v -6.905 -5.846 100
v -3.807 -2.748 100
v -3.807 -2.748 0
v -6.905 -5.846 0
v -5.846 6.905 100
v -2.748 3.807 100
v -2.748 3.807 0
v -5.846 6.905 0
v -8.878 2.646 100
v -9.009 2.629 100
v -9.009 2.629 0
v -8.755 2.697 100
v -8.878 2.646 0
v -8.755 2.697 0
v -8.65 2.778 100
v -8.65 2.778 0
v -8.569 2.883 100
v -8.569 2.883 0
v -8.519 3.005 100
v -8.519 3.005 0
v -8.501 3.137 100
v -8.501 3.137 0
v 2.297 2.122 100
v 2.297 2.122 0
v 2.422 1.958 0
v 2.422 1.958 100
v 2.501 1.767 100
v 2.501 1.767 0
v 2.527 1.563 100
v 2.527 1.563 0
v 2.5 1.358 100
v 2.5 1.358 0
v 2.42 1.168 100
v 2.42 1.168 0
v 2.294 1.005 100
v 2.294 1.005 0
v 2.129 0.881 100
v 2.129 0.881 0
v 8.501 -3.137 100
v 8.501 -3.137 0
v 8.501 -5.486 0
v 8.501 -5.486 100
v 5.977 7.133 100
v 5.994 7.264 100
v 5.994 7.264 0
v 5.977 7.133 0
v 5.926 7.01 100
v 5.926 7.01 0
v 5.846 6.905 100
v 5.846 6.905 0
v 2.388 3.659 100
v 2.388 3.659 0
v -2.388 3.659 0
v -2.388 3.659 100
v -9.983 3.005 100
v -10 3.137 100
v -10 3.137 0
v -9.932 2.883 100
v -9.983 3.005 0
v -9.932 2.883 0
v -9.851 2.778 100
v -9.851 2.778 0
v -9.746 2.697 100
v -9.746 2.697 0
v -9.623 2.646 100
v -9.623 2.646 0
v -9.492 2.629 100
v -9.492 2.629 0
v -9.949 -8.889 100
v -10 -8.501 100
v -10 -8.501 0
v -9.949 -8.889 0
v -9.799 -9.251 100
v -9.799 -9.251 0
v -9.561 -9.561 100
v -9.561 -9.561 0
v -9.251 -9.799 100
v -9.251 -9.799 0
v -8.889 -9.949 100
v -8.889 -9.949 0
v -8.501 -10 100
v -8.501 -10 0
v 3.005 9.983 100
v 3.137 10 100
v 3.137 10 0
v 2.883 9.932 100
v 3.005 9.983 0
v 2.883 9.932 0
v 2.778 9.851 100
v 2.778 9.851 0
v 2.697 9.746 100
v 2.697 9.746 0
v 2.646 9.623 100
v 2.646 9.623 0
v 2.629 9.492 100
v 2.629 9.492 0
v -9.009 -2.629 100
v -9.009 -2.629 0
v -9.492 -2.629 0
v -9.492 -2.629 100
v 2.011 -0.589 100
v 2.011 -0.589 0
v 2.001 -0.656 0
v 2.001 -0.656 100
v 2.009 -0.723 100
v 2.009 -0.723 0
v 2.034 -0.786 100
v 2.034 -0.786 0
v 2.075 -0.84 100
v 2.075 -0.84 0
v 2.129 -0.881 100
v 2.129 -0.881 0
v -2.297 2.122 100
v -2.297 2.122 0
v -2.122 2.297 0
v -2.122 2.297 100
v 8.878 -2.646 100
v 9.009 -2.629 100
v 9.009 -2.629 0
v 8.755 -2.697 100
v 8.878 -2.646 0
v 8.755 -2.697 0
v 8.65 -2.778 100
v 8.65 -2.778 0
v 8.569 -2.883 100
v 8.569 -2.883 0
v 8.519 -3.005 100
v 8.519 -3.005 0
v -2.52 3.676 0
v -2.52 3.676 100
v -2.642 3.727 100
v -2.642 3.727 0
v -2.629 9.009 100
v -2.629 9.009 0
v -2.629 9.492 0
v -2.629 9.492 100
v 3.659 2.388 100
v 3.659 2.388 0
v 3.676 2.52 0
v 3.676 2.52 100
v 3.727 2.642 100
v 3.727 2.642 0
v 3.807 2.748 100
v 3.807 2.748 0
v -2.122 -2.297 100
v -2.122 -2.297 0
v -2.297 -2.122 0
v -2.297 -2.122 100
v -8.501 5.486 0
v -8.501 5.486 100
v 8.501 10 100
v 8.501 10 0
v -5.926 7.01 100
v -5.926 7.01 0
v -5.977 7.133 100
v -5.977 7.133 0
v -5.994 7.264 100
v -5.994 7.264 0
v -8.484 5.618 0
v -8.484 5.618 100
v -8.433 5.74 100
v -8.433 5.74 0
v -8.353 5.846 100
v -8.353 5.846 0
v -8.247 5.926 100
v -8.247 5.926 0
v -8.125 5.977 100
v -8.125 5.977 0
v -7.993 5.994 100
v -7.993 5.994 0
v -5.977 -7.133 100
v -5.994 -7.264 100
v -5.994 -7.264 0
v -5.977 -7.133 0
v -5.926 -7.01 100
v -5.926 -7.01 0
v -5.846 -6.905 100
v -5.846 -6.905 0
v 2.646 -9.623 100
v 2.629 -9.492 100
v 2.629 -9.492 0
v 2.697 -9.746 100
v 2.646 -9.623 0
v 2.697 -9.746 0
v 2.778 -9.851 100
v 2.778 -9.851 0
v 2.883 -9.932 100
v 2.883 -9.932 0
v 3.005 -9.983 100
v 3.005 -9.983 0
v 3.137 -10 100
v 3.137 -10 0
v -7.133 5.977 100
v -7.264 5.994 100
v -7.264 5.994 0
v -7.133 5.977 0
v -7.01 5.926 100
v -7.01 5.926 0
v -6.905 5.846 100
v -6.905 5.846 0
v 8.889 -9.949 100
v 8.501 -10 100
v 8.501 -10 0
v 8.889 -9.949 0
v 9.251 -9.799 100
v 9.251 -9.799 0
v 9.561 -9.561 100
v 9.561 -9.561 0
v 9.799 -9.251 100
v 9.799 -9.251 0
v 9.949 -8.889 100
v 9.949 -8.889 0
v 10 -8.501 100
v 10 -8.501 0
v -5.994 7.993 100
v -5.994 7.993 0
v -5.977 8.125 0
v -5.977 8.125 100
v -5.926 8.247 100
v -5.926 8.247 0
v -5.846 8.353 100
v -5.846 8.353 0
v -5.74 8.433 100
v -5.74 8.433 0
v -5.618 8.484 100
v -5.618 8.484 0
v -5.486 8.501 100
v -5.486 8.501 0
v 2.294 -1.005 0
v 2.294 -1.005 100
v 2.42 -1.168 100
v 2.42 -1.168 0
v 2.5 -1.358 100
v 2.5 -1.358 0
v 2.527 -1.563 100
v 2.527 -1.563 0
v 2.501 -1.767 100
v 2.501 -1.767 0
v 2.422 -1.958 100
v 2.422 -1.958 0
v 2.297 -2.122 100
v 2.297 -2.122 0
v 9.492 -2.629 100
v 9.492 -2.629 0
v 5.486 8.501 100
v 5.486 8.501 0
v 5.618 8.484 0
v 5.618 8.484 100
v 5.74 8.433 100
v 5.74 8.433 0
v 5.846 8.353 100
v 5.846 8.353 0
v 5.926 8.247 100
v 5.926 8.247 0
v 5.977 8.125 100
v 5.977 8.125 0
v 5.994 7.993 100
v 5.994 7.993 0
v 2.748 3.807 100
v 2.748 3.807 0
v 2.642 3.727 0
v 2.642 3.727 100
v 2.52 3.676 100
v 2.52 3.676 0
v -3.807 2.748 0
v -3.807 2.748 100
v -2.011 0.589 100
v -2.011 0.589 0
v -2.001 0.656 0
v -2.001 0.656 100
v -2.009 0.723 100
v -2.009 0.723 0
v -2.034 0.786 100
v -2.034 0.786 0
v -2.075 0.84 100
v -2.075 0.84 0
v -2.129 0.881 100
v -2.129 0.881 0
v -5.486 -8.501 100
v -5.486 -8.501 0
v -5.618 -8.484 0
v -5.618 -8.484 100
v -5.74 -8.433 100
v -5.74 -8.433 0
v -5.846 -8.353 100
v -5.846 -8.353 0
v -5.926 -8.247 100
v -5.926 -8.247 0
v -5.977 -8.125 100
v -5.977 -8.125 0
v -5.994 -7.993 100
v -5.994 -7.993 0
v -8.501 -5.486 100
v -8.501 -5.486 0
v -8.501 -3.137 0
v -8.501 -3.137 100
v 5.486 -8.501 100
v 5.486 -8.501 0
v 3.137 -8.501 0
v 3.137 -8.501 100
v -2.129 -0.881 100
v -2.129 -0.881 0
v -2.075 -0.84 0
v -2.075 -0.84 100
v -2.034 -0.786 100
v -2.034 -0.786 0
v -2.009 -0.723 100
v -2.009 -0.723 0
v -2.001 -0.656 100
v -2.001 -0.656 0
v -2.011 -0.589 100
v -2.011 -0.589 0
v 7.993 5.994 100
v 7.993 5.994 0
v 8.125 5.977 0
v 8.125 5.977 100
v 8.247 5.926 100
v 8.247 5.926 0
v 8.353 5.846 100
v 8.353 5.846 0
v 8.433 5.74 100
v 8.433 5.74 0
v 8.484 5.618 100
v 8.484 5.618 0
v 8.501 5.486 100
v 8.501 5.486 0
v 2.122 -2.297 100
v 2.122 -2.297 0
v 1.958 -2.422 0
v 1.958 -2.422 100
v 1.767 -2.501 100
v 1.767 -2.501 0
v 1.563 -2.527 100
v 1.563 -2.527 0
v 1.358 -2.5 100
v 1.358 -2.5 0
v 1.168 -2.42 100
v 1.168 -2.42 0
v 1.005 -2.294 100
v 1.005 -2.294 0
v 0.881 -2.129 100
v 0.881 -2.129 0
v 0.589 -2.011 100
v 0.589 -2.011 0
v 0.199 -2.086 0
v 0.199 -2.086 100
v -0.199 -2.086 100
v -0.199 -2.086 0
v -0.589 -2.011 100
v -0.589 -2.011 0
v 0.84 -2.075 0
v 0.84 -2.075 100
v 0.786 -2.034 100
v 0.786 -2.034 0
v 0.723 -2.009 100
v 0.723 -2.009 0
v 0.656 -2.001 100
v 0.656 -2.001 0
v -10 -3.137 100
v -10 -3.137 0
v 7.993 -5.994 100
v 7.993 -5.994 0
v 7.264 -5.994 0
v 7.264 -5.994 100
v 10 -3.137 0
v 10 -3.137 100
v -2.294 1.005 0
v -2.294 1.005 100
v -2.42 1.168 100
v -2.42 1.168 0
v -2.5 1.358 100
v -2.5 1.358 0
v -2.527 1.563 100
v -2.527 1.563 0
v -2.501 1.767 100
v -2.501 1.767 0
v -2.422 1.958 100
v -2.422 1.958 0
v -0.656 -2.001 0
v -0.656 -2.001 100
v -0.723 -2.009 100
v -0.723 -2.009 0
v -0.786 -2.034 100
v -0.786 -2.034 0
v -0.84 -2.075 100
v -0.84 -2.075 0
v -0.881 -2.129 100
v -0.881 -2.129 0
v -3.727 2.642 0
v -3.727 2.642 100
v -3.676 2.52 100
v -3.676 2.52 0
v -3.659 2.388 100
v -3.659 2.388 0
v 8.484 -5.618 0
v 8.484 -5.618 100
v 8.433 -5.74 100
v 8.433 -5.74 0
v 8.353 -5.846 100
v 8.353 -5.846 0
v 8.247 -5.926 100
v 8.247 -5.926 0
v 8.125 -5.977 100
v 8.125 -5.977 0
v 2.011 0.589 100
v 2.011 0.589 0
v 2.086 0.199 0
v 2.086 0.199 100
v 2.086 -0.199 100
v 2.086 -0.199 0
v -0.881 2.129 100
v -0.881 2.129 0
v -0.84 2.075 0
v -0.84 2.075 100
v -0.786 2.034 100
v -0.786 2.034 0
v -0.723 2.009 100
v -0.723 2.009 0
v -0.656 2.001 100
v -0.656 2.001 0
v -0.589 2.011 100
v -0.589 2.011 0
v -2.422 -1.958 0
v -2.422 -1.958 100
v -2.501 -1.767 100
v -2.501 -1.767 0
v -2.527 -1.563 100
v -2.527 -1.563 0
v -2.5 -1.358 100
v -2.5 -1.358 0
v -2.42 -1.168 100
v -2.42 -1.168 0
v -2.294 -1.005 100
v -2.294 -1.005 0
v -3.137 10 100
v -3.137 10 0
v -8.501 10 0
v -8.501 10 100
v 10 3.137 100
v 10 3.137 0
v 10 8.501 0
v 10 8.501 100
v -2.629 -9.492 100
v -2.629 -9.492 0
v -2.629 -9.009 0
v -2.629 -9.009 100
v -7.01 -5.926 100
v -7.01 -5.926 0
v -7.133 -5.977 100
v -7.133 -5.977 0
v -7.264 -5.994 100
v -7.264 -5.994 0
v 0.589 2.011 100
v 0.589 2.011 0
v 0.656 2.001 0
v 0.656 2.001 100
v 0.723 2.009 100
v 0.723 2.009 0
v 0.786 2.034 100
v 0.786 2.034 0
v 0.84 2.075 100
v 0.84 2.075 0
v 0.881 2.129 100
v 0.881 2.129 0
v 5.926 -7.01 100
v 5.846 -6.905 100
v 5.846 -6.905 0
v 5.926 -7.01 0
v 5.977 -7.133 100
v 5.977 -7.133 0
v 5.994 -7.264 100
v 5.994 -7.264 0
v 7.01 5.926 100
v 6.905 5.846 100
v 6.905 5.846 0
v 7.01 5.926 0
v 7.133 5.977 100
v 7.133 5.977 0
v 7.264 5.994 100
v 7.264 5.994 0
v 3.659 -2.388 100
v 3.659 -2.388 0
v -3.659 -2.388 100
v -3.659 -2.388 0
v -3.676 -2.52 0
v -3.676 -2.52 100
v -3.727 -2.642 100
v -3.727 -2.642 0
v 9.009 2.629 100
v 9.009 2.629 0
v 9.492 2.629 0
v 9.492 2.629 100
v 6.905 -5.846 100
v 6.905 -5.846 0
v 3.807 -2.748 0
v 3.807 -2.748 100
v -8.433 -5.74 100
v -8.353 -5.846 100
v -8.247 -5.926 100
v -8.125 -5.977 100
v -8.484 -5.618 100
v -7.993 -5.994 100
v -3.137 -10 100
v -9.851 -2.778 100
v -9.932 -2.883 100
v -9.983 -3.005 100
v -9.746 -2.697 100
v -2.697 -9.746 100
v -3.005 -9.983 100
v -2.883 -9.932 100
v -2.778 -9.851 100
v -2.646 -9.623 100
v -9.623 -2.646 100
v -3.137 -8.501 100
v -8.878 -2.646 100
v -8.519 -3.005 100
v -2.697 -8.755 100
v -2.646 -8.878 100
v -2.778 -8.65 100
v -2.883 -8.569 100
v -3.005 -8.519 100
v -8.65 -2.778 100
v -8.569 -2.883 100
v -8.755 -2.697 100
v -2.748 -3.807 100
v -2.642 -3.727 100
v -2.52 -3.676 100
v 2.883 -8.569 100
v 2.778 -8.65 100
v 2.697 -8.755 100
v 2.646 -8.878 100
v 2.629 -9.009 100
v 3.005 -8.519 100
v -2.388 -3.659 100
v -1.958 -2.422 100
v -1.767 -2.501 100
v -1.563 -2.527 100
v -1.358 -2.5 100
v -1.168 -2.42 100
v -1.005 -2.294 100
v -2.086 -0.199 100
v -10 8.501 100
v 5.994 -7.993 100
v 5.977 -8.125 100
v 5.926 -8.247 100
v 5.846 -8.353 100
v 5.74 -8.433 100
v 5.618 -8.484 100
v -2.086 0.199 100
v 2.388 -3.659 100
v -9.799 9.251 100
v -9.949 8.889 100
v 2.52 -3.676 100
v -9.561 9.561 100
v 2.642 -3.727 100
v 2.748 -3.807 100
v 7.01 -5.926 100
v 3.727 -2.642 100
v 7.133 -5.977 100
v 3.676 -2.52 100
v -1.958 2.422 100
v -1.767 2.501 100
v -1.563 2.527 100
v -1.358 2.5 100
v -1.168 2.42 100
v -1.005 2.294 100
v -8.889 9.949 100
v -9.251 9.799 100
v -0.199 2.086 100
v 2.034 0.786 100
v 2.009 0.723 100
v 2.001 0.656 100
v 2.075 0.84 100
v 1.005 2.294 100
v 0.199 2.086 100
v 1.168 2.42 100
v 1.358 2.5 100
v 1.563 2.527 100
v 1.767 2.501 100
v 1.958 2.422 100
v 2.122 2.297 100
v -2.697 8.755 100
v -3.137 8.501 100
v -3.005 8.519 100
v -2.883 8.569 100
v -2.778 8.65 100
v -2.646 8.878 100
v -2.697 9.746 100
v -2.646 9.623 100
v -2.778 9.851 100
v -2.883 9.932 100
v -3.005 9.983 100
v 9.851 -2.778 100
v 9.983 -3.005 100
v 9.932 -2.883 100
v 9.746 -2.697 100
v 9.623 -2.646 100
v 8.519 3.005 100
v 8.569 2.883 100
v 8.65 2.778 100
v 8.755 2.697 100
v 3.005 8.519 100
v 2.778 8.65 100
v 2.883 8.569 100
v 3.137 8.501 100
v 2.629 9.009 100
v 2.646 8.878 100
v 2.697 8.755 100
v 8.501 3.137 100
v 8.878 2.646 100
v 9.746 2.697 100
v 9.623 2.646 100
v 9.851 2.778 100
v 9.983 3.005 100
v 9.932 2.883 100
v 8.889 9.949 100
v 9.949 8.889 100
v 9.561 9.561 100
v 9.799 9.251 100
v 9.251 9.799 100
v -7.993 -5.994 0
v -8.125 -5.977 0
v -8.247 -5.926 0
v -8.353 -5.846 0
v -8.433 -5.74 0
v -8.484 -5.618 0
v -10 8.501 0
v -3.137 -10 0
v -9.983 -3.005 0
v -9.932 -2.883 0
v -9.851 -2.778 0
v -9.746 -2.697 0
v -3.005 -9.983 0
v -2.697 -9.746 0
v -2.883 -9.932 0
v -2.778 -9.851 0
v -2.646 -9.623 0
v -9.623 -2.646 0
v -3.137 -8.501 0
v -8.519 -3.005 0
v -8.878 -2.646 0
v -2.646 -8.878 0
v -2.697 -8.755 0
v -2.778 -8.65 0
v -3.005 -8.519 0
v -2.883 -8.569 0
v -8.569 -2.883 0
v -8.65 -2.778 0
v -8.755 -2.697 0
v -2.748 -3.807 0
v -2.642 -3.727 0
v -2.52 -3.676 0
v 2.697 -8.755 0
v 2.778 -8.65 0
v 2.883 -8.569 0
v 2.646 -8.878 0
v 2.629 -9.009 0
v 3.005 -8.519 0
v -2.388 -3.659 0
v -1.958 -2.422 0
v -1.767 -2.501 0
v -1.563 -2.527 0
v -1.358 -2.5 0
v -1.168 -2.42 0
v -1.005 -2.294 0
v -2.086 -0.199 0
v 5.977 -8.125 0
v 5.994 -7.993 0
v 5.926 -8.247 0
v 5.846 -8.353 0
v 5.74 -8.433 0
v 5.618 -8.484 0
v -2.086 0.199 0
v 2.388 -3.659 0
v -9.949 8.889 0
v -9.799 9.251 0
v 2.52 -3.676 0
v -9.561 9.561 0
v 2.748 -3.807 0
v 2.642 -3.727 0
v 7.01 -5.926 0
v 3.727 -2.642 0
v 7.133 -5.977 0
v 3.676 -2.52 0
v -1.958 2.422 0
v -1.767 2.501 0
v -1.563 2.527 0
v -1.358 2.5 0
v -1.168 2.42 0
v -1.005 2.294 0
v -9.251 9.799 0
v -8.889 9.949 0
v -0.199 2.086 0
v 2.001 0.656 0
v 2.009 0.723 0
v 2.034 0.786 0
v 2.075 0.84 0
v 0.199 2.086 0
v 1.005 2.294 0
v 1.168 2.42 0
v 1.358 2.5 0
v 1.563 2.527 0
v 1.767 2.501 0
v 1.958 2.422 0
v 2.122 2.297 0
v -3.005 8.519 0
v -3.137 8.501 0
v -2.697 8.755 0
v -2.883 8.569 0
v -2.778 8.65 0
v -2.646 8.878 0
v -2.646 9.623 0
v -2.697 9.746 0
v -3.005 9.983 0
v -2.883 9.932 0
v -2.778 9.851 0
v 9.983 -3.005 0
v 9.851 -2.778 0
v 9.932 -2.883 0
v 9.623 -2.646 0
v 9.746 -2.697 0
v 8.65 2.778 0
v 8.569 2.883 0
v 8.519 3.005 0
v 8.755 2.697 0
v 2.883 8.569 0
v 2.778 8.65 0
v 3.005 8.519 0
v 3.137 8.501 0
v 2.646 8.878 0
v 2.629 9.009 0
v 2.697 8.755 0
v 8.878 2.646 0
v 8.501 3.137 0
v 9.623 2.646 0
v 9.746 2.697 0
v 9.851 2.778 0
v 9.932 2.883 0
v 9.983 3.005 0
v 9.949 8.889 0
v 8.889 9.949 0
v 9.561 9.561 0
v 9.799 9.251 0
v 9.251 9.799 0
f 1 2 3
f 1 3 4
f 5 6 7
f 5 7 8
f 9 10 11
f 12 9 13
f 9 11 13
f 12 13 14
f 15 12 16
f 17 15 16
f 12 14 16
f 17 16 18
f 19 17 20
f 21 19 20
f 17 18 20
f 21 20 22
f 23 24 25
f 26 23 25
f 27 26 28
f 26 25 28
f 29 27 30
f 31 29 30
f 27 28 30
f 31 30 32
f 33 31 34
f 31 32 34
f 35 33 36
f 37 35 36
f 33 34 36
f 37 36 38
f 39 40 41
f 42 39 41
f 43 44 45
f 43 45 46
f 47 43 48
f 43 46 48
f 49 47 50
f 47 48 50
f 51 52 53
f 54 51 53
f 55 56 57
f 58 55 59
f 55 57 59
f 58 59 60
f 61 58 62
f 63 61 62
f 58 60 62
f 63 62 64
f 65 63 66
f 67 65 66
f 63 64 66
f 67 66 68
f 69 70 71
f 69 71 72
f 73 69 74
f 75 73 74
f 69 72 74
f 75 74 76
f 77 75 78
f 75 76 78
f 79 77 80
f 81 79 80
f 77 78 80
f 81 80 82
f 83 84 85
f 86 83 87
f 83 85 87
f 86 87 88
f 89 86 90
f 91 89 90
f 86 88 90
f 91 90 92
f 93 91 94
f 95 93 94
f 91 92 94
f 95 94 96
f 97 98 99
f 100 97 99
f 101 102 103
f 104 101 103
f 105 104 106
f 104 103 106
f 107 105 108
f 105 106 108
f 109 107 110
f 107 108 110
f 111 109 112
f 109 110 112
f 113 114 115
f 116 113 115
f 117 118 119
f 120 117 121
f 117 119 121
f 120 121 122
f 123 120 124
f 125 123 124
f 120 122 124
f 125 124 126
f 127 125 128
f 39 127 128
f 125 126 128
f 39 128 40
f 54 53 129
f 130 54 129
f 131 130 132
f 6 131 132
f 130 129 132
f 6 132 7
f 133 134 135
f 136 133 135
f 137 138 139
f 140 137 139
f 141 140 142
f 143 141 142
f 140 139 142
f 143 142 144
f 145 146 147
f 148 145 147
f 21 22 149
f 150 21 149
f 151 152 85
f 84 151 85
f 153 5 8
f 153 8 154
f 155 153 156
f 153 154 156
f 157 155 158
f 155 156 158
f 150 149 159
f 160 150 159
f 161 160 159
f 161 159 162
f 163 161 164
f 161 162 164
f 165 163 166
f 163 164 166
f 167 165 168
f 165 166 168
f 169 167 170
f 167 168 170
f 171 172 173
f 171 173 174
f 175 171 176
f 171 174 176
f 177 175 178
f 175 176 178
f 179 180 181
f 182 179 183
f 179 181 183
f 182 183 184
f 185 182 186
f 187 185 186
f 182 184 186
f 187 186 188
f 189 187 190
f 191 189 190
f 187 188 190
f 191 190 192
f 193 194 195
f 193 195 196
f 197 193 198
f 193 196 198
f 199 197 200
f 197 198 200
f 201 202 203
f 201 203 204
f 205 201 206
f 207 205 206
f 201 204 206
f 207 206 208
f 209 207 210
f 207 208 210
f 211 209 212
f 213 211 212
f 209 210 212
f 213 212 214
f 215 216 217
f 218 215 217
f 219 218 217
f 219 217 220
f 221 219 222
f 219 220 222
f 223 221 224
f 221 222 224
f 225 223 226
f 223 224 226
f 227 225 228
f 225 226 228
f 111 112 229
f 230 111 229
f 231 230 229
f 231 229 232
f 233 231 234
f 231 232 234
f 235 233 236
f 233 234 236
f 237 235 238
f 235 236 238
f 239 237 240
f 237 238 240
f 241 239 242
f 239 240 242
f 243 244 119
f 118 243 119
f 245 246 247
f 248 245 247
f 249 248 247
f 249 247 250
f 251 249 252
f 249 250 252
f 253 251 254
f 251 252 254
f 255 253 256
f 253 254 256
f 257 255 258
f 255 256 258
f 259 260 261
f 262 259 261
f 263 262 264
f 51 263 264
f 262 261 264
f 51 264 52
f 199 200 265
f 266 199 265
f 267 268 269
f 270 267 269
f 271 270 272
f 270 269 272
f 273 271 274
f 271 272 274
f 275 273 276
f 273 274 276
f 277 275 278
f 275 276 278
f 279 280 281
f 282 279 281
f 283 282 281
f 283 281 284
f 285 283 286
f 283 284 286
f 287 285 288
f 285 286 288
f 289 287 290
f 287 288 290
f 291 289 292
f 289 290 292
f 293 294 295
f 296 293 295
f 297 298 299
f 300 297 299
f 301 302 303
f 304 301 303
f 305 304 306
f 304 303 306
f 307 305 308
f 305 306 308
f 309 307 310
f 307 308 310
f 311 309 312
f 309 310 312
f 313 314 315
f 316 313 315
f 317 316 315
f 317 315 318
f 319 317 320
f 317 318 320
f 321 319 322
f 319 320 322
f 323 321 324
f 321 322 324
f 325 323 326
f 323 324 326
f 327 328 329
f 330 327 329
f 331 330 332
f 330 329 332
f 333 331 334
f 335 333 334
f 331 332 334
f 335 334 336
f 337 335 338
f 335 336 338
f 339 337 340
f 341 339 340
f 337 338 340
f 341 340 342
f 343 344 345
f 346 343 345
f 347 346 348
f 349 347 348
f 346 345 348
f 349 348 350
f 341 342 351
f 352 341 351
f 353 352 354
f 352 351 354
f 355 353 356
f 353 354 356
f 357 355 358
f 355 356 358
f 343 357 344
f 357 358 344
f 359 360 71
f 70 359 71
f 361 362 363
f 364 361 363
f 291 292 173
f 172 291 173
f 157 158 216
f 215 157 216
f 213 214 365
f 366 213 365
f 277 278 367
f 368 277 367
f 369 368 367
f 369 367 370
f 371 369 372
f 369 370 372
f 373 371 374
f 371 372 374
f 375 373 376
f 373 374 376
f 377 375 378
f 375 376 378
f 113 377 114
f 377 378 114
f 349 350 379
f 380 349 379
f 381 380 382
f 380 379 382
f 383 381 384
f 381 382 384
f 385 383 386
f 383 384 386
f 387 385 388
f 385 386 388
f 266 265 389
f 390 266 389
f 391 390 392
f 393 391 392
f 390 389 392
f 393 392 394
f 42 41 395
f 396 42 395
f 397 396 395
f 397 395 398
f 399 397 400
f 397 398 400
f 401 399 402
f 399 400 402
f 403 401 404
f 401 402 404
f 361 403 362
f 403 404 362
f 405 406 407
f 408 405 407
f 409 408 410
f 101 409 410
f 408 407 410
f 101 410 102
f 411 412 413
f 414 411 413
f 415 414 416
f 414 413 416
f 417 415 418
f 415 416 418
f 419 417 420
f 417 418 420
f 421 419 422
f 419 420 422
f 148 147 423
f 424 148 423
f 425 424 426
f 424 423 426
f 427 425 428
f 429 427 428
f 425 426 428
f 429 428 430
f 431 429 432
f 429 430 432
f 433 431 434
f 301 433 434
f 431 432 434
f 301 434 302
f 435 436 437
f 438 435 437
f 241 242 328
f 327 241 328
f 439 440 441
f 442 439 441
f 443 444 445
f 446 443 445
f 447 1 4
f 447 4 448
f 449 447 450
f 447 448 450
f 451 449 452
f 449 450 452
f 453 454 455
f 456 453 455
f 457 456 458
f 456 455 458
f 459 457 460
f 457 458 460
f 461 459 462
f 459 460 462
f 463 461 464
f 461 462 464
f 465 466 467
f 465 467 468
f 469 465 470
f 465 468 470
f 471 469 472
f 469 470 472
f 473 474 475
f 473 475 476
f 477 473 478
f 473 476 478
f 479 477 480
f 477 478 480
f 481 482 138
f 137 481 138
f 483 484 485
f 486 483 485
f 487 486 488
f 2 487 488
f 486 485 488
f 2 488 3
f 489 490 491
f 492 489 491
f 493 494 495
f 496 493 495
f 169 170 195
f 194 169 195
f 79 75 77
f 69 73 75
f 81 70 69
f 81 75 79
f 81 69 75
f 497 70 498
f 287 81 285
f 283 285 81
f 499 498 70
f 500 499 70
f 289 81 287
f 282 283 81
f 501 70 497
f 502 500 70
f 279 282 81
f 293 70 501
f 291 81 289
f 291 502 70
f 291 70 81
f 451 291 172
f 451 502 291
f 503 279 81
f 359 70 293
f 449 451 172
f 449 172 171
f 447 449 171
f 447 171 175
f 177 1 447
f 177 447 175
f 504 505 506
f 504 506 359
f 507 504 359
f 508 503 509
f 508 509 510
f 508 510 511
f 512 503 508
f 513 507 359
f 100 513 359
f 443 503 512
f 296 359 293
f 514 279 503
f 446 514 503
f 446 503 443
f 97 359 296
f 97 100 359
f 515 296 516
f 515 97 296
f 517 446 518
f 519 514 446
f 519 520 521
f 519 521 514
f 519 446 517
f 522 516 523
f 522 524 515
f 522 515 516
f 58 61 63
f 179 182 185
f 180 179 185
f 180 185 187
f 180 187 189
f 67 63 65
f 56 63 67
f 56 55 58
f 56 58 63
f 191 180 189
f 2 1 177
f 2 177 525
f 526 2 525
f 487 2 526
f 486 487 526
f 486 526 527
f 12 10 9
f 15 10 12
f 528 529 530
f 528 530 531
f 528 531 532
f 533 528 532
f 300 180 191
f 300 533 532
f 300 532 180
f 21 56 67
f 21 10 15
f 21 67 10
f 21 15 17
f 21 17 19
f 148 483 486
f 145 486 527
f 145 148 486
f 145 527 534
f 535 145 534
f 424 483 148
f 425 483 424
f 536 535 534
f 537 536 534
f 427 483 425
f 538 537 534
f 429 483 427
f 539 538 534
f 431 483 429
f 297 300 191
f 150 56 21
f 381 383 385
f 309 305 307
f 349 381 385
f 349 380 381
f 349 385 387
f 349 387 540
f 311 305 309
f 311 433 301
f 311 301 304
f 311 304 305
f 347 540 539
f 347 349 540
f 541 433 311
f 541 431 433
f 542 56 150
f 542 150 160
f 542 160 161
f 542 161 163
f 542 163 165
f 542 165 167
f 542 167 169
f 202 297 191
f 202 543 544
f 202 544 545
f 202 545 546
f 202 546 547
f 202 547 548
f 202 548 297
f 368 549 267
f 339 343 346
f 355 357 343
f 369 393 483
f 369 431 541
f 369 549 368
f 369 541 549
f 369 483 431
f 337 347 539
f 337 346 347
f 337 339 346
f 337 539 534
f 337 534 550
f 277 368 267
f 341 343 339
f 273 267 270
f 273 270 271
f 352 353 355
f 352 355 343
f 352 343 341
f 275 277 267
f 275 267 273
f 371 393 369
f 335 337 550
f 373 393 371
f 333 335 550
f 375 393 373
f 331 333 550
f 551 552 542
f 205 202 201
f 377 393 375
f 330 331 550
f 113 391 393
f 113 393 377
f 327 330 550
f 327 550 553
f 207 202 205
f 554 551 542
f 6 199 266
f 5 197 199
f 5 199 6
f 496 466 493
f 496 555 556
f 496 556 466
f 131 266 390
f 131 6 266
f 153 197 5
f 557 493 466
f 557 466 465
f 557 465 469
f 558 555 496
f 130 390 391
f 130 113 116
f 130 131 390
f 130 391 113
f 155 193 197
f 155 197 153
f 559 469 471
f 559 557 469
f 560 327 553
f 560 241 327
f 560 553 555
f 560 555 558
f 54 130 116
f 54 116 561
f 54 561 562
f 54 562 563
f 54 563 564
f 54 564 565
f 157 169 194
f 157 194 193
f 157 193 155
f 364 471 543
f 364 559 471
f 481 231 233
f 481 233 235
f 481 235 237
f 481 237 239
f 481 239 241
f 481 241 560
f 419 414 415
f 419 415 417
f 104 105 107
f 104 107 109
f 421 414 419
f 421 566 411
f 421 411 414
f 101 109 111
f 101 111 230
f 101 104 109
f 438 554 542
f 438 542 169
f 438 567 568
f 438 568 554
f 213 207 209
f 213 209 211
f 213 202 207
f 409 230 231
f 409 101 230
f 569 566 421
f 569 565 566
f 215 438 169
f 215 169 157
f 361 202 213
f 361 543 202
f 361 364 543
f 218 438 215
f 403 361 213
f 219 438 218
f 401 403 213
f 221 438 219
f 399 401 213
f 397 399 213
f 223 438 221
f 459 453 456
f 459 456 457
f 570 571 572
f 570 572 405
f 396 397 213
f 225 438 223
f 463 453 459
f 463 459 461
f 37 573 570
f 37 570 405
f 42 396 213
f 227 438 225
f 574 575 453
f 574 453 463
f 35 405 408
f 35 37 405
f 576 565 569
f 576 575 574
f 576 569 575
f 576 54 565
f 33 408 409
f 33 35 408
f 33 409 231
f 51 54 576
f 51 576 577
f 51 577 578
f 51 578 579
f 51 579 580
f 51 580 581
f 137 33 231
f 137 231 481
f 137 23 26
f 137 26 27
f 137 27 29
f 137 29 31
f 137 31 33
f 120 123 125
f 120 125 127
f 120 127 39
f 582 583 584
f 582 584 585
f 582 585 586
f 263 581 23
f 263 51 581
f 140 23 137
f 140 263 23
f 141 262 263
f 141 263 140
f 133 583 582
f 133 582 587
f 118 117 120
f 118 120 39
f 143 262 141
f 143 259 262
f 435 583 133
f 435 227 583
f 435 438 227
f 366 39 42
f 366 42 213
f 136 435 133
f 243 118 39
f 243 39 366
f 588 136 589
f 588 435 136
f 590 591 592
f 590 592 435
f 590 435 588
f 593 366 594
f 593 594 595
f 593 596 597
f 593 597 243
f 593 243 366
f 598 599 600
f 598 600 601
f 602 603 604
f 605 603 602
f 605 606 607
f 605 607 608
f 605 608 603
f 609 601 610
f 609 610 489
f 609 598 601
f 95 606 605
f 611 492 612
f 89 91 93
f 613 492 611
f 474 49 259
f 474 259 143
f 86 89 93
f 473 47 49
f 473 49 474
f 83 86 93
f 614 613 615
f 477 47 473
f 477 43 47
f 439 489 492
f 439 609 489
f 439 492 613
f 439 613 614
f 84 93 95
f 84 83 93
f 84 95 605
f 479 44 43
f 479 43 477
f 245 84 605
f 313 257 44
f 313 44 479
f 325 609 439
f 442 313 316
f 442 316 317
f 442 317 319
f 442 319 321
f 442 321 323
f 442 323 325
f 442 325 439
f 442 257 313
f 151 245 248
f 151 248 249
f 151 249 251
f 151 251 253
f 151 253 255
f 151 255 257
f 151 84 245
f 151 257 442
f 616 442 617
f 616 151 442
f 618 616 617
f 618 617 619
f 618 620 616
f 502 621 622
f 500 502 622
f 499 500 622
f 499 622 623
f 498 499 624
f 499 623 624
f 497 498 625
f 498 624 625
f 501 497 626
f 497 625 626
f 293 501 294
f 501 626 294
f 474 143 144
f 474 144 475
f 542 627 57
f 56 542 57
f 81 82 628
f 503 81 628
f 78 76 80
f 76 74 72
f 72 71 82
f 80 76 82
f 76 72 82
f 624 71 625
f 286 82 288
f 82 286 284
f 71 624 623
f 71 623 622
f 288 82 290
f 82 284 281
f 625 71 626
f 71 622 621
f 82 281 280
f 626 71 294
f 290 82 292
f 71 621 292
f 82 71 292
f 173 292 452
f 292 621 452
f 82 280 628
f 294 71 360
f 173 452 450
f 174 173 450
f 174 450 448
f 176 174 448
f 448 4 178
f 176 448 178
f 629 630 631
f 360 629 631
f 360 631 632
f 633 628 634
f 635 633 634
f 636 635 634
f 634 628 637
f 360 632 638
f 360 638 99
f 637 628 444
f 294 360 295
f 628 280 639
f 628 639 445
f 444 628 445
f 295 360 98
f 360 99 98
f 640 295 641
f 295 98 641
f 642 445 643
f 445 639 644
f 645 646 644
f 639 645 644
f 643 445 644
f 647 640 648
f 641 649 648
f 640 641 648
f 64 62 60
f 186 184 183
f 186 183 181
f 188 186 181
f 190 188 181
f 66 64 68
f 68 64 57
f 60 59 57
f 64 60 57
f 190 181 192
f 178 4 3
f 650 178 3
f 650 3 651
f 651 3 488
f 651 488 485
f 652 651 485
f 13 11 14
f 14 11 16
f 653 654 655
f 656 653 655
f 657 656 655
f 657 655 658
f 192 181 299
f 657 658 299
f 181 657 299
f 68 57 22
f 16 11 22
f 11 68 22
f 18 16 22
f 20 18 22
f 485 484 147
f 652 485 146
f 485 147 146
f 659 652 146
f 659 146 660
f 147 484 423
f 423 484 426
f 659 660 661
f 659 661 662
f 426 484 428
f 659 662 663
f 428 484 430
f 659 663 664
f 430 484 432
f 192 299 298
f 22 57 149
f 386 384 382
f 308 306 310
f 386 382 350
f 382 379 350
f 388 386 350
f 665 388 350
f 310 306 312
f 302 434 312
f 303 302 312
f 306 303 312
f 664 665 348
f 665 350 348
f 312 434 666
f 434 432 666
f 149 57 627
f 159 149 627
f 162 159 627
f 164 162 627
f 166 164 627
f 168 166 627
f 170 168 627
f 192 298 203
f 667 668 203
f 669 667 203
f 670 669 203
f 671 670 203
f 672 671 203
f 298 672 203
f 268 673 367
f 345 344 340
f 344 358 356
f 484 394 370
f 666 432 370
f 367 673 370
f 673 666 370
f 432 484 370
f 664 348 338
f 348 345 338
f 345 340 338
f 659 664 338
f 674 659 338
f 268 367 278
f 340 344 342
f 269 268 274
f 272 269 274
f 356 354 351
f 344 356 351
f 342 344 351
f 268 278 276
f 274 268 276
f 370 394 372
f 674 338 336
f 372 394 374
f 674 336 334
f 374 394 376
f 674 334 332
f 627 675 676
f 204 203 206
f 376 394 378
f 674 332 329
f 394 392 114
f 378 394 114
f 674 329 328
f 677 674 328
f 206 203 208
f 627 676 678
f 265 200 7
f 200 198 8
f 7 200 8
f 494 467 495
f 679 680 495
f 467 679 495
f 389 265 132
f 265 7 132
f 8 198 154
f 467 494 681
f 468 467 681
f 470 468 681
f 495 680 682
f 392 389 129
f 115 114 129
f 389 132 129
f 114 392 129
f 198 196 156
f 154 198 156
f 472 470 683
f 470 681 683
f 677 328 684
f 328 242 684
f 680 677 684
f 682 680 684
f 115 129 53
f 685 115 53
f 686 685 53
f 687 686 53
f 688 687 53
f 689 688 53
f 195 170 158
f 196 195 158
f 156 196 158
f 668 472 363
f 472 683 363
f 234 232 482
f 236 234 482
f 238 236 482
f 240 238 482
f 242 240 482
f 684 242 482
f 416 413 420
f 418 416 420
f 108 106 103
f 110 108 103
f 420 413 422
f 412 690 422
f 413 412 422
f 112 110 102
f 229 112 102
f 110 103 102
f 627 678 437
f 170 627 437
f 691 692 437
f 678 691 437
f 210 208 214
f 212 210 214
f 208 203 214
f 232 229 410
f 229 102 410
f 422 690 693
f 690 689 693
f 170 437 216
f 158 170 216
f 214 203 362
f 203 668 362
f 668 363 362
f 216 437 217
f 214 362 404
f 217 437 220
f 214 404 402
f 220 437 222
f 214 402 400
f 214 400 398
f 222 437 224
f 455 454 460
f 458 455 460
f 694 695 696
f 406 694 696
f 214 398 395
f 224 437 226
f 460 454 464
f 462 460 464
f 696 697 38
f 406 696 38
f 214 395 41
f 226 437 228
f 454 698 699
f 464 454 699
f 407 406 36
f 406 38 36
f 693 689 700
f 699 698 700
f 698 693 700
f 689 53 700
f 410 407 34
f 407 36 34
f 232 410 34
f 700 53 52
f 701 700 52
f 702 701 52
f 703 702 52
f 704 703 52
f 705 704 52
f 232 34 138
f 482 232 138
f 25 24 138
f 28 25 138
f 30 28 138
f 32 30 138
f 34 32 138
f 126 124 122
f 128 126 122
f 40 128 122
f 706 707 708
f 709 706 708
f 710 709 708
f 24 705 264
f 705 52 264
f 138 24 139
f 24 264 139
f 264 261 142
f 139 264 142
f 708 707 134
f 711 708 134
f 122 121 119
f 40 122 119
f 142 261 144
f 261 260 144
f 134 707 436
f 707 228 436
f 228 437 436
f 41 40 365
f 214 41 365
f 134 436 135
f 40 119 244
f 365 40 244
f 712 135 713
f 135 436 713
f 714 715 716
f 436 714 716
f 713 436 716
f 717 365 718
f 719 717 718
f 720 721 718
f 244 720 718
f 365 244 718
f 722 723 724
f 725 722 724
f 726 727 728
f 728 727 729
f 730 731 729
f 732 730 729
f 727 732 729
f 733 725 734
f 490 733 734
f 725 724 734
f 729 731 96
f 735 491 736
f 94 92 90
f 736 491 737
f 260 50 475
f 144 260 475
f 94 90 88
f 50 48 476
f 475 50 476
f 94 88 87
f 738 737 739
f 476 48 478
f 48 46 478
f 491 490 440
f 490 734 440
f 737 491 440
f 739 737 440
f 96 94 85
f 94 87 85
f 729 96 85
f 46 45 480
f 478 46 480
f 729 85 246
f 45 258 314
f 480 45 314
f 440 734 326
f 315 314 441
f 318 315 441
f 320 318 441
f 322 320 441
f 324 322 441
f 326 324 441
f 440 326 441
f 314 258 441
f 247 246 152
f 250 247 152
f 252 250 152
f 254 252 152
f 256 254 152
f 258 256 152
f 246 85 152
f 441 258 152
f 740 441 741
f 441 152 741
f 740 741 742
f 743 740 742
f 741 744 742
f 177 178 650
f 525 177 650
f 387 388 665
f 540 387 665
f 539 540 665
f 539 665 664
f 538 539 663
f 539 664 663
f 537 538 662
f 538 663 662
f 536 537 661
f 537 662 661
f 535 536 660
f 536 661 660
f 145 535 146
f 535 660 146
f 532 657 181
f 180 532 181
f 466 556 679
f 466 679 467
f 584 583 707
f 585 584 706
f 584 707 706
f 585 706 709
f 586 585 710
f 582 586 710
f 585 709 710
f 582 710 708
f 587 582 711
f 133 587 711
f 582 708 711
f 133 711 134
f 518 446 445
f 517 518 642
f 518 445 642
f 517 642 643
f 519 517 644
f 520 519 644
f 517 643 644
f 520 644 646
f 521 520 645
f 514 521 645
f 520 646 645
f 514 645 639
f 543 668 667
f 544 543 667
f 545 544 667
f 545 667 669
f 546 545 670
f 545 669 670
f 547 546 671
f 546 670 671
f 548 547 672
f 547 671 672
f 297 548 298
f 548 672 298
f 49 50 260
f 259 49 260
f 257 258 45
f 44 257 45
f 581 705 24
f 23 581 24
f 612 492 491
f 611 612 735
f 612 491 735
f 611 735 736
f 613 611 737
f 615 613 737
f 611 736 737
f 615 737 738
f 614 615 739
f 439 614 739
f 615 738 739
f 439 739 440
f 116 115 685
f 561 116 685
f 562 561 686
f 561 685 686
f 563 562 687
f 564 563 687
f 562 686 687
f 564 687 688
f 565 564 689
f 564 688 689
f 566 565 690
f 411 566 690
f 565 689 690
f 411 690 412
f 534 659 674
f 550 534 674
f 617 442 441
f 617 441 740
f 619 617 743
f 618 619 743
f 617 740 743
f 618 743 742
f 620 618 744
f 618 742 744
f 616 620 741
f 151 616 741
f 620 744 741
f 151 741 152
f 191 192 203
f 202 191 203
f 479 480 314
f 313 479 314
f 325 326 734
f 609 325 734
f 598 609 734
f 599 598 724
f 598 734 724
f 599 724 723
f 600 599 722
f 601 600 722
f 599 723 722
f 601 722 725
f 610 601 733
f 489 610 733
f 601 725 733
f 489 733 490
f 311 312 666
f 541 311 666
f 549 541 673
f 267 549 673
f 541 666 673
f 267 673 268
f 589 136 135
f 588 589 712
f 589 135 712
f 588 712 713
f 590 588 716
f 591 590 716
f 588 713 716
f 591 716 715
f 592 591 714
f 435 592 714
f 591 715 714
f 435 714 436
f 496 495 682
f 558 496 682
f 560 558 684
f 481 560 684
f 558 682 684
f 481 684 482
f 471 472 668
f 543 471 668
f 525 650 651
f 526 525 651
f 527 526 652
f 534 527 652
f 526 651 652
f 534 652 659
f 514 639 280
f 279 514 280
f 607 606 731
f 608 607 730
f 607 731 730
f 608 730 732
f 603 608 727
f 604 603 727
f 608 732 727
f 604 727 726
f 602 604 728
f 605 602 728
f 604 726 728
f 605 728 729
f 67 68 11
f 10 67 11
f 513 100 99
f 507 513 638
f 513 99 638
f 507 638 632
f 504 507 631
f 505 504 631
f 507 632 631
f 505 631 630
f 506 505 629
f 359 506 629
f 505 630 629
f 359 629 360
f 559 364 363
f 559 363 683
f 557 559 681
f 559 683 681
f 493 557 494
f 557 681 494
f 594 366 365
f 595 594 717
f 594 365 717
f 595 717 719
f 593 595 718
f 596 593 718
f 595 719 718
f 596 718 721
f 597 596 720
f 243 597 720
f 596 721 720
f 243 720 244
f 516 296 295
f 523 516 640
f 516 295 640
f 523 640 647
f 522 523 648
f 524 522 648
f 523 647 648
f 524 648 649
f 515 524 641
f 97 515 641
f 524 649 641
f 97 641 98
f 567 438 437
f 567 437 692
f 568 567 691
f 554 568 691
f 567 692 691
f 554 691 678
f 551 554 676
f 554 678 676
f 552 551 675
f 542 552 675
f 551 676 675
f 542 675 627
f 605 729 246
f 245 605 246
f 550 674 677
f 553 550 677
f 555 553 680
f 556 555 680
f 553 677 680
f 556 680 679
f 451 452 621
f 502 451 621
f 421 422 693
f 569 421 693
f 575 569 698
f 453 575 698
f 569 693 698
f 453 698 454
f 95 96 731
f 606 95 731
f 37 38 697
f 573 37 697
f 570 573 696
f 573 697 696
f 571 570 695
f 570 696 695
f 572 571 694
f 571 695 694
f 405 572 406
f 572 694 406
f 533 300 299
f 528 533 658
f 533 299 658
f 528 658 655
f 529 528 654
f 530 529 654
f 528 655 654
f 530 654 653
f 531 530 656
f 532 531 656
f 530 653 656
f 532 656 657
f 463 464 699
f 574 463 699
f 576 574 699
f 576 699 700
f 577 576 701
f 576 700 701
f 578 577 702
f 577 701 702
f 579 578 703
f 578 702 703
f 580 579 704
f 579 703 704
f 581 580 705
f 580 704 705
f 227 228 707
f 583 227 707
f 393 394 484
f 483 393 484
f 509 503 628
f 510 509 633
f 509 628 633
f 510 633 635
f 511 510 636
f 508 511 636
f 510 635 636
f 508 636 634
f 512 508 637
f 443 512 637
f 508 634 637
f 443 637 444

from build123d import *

# Parameters (mm, degrees)
BOSS_EXTRUDE1_DEPTH = 100


with BuildPart() as part:
    # Sketch1 → Boss-Extrude1 (new body)
    with BuildSketch(Plane.XY):
        with BuildLine():
            Line((9.0094, 2.6289), (9.492, 2.6289))
            ThreePointArc((9.492, 2.6289), (9.851210245, 2.777689755), (10, 3.1369))
            Line((10, 3.1369), (10, 8.5014))
            ThreePointArc((10, 8.5014), (9.561070222, 9.561070222), (8.5014, 10))
            Line((8.5014, 10), (3.1369, 10))
            ThreePointArc((3.1369, 10), (2.777689755, 9.851210245), (2.6289, 9.492))
            Line((2.6289, 9.492), (2.6289, 9.0094))
            ThreePointArc((2.6289, 9.0094), (2.777689755, 8.650189755), (3.1369, 8.5014))
            Line((3.1369, 8.5014), (5.4864, 8.5014))
            ThreePointArc((5.4864, 8.5014), (5.845610245, 8.352610245), (5.9944, 7.9934))
            Line((5.9944, 7.9934), (5.9944, 7.264490712))
            ThreePointArc((5.9944, 7.264490712), (5.955730803, 7.070087528), (5.845610245, 6.905280467))
            Line((5.845610245, 6.905280467), (2.747686782, 3.807357004))
            ThreePointArc((2.747686782, 3.807357004), (2.582879721, 3.697236446), (2.388476537, 3.658567249))
            Line((2.388476537, 3.658567249), (-2.388476537, 3.658567249))
            ThreePointArc((-2.388476537, 3.658567249), (-2.582879721, 3.697236446), (-2.747686782, 3.807357004))
            Line((-2.747686782, 3.807357004), (-5.845610245, 6.905280467))
            ThreePointArc((-5.845610245, 6.905280467), (-5.955730803, 7.070087528), (-5.9944, 7.264490712))
            Line((-5.9944, 7.264490712), (-5.9944, 7.9934))
            ThreePointArc((-5.9944, 7.9934), (-5.845610245, 8.352610245), (-5.4864, 8.5014))
            Line((-5.4864, 8.5014), (-3.1369, 8.5014))
            ThreePointArc((-3.1369, 8.5014), (-2.777689755, 8.650189755), (-2.6289, 9.0094))
            Line((-2.6289, 9.0094), (-2.6289, 9.492))
            ThreePointArc((-2.6289, 9.492), (-2.777689755, 9.851210245), (-3.1369, 10))
            Line((-3.1369, 10), (-8.5014, 10))
            ThreePointArc((-8.5014, 10), (-9.561070222, 9.561070222), (-10, 8.5014))
            Line((-10, 8.5014), (-10, 3.1369))
            ThreePointArc((-10, 3.1369), (-9.851210245, 2.777689755), (-9.492, 2.6289))
            Line((-9.492, 2.6289), (-9.0094, 2.6289))
            ThreePointArc((-9.0094, 2.6289), (-8.650189755, 2.777689755), (-8.5014, 3.1369))
            Line((-8.5014, 3.1369), (-8.5014, 5.4864))
            ThreePointArc((-8.5014, 5.4864), (-8.352610245, 5.845610245), (-7.9934, 5.9944))
            Line((-7.9934, 5.9944), (-7.264490712, 5.9944))
            ThreePointArc((-7.264490712, 5.9944), (-7.070087528, 5.955730803), (-6.905280467, 5.845610245))
            Line((-6.905280467, 5.845610245), (-3.807357004, 2.747686782))
            ThreePointArc((-3.807357004, 2.747686782), (-3.697236446, 2.582879721), (-3.658567249, 2.388476537))
            Line((-3.658567249, 2.388476537), (-3.658567249, -2.388476537))
            ThreePointArc((-3.658567249, -2.388476537), (-3.697236446, -2.582879721), (-3.807357004, -2.747686782))
            Line((-3.807357004, -2.747686782), (-6.905280467, -5.845610245))
            ThreePointArc((-6.905280467, -5.845610245), (-7.070087528, -5.955730803), (-7.264490712, -5.9944))
            Line((-7.264490712, -5.9944), (-7.9934, -5.9944))
            ThreePointArc((-7.9934, -5.9944), (-8.352610245, -5.845610245), (-8.5014, -5.4864))
            Line((-8.5014, -5.4864), (-8.5014, -3.1369))
            ThreePointArc((-8.5014, -3.1369), (-8.650189755, -2.777689755), (-9.0094, -2.6289))
            Line((-9.0094, -2.6289), (-9.492, -2.6289))
            ThreePointArc((-9.492, -2.6289), (-9.851210245, -2.777689755), (-10, -3.1369))
            Line((-10, -3.1369), (-10, -8.5014))
            ThreePointArc((-10, -8.5014), (-9.561070222, -9.561070222), (-8.5014, -10))
            Line((-8.5014, -10), (-3.1369, -10))
            ThreePointArc((-3.1369, -10), (-2.777689755, -9.851210245), (-2.6289, -9.492))
            Line((-2.6289, -9.492), (-2.6289, -9.0094))
            ThreePointArc((-2.6289, -9.0094), (-2.777689755, -8.650189755), (-3.1369, -8.5014))
            Line((-3.1369, -8.5014), (-5.4864, -8.5014))
            ThreePointArc((-5.4864, -8.5014), (-5.845610245, -8.352610245), (-5.9944, -7.9934))
            Line((-5.9944, -7.9934), (-5.9944, -7.264490712))
            ThreePointArc((-5.9944, -7.264490712), (-5.955730803, -7.070087528), (-5.845610245, -6.905280467))
            Line((-5.845610245, -6.905280467), (-2.747686782, -3.807357004))
            ThreePointArc((-2.747686782, -3.807357004), (-2.582879721, -3.697236446), (-2.388476537, -3.658567249))
            Line((-2.388476537, -3.658567249), (2.388476537, -3.658567249))
            ThreePointArc((2.388476537, -3.658567249), (2.582879721, -3.697236446), (2.747686782, -3.807357004))
            Line((2.747686782, -3.807357004), (5.845610245, -6.905280467))
            ThreePointArc((5.845610245, -6.905280467), (5.955730803, -7.070087528), (5.9944, -7.264490712))
            Line((5.9944, -7.264490712), (5.9944, -7.9934))
            ThreePointArc((5.9944, -7.9934), (5.845610245, -8.352610245), (5.4864, -8.5014))
            Line((5.4864, -8.5014), (3.1369, -8.5014))
            ThreePointArc((3.1369, -8.5014), (2.777689755, -8.650189755), (2.6289, -9.0094))
            Line((2.6289, -9.0094), (2.6289, -9.492))
            ThreePointArc((2.6289, -9.492), (2.777689755, -9.851210245), (3.1369, -10))
            Line((3.1369, -10), (8.5014, -10))
            ThreePointArc((8.5014, -10), (9.561070222, -9.561070222), (10, -8.5014))
            Line((10, -8.5014), (10, -3.1369))
            ThreePointArc((10, -3.1369), (9.851210245, -2.777689755), (9.492, -2.6289))
            Line((9.492, -2.6289), (9.0094, -2.6289))
            ThreePointArc((9.0094, -2.6289), (8.650189755, -2.777689755), (8.5014, -3.1369))
            Line((8.5014, -3.1369), (8.5014, -5.4864))
            ThreePointArc((8.5014, -5.4864), (8.352610245, -5.845610245), (7.9934, -5.9944))
            Line((7.9934, -5.9944), (7.264490712, -5.9944))
            ThreePointArc((7.264490712, -5.9944), (7.070087528, -5.955730803), (6.905280467, -5.845610245))
            Line((6.905280467, -5.845610245), (3.807357004, -2.747686782))
            ThreePointArc((3.807357004, -2.747686782), (3.697236446, -2.582879721), (3.658567249, -2.388476537))
            Line((3.658567249, -2.388476537), (3.658567249, 2.388476537))
            ThreePointArc((3.658567249, 2.388476537), (3.697236446, 2.582879721), (3.807357004, 2.747686782))
            Line((3.807357004, 2.747686782), (6.905280467, 5.845610245))
            ThreePointArc((6.905280467, 5.845610245), (7.070087528, 5.955730803), (7.264490712, 5.9944))
            Line((7.264490712, 5.9944), (7.9934, 5.9944))
            ThreePointArc((7.9934, 5.9944), (8.352610245, 5.845610245), (8.5014, 5.4864))
            Line((8.5014, 5.4864), (8.5014, 3.1369))
            ThreePointArc((8.5014, 3.1369), (8.650189755, 2.777689755), (9.0094, 2.6289))
        make_face()
        with BuildLine():
            Line((-2.296558466, 2.121727546), (-2.121727546, 2.296558466))
            ThreePointArc((-2.121727546, 2.296558466), (-1.459775814, 2.520126613), (-0.880635441, 2.129282347))
            ThreePointArc((-0.880635441, 2.129282347), (-0.755121693, 2.019456424), (-0.588548999, 2.011151493))
            ThreePointArc((-0.588548999, 2.011151493), (0, 2.0955), (0.588548999, 2.011151493))
            ThreePointArc((0.588548999, 2.011151493), (0.755121693, 2.019456424), (0.880635441, 2.129282347))
            ThreePointArc((0.880635441, 2.129282347), (1.459775814, 2.520126613), (2.121727546, 2.296558466))
            Line((2.121727546, 2.296558466), (2.296558466, 2.121727546))
            ThreePointArc((2.296558466, 2.121727546), (2.520126613, 1.459775814), (2.129282347, 0.880635441))
            ThreePointArc((2.129282347, 0.880635441), (2.019456424, 0.755121693), (2.011151493, 0.588548999))
            ThreePointArc((2.011151493, 0.588548999), (2.0955, 0), (2.011151493, -0.588548999))
            ThreePointArc((2.011151493, -0.588548999), (2.019456424, -0.755121693), (2.129282347, -0.880635441))
            ThreePointArc((2.129282347, -0.880635441), (2.520126613, -1.459775814), (2.296558466, -2.121727546))
            Line((2.296558466, -2.121727546), (2.121727546, -2.296558466))
            ThreePointArc((2.121727546, -2.296558466), (1.459775814, -2.520126613), (0.880635441, -2.129282347))
            ThreePointArc((0.880635441, -2.129282347), (0.755121693, -2.019456424), (0.588548999, -2.011151493))
            ThreePointArc((0.588548999, -2.011151493), (0, -2.0955), (-0.588548999, -2.011151493))
            ThreePointArc((-0.588548999, -2.011151493), (-0.755121693, -2.019456424), (-0.880635441, -2.129282347))
            ThreePointArc((-0.880635441, -2.129282347), (-1.459775814, -2.520126613), (-2.121727546, -2.296558466))
            Line((-2.121727546, -2.296558466), (-2.296558466, -2.121727546))
            ThreePointArc((-2.296558466, -2.121727546), (-2.520126613, -1.459775814), (-2.129282347, -0.880635441))
            ThreePointArc((-2.129282347, -0.880635441), (-2.019456424, -0.755121693), (-2.011151493, -0.588548999))
            ThreePointArc((-2.011151493, -0.588548999), (-2.0955, 0), (-2.011151493, 0.588548999))
            ThreePointArc((-2.011151493, 0.588548999), (-2.019456424, 0.755121693), (-2.129282347, 0.880635441))
            ThreePointArc((-2.129282347, 0.880635441), (-2.520126613, 1.459775814), (-2.296558466, 2.121727546))
        make_face(mode=Mode.SUBTRACT)
    extrude(amount=BOSS_EXTRUDE1_DEPTH)


solid = part.part
